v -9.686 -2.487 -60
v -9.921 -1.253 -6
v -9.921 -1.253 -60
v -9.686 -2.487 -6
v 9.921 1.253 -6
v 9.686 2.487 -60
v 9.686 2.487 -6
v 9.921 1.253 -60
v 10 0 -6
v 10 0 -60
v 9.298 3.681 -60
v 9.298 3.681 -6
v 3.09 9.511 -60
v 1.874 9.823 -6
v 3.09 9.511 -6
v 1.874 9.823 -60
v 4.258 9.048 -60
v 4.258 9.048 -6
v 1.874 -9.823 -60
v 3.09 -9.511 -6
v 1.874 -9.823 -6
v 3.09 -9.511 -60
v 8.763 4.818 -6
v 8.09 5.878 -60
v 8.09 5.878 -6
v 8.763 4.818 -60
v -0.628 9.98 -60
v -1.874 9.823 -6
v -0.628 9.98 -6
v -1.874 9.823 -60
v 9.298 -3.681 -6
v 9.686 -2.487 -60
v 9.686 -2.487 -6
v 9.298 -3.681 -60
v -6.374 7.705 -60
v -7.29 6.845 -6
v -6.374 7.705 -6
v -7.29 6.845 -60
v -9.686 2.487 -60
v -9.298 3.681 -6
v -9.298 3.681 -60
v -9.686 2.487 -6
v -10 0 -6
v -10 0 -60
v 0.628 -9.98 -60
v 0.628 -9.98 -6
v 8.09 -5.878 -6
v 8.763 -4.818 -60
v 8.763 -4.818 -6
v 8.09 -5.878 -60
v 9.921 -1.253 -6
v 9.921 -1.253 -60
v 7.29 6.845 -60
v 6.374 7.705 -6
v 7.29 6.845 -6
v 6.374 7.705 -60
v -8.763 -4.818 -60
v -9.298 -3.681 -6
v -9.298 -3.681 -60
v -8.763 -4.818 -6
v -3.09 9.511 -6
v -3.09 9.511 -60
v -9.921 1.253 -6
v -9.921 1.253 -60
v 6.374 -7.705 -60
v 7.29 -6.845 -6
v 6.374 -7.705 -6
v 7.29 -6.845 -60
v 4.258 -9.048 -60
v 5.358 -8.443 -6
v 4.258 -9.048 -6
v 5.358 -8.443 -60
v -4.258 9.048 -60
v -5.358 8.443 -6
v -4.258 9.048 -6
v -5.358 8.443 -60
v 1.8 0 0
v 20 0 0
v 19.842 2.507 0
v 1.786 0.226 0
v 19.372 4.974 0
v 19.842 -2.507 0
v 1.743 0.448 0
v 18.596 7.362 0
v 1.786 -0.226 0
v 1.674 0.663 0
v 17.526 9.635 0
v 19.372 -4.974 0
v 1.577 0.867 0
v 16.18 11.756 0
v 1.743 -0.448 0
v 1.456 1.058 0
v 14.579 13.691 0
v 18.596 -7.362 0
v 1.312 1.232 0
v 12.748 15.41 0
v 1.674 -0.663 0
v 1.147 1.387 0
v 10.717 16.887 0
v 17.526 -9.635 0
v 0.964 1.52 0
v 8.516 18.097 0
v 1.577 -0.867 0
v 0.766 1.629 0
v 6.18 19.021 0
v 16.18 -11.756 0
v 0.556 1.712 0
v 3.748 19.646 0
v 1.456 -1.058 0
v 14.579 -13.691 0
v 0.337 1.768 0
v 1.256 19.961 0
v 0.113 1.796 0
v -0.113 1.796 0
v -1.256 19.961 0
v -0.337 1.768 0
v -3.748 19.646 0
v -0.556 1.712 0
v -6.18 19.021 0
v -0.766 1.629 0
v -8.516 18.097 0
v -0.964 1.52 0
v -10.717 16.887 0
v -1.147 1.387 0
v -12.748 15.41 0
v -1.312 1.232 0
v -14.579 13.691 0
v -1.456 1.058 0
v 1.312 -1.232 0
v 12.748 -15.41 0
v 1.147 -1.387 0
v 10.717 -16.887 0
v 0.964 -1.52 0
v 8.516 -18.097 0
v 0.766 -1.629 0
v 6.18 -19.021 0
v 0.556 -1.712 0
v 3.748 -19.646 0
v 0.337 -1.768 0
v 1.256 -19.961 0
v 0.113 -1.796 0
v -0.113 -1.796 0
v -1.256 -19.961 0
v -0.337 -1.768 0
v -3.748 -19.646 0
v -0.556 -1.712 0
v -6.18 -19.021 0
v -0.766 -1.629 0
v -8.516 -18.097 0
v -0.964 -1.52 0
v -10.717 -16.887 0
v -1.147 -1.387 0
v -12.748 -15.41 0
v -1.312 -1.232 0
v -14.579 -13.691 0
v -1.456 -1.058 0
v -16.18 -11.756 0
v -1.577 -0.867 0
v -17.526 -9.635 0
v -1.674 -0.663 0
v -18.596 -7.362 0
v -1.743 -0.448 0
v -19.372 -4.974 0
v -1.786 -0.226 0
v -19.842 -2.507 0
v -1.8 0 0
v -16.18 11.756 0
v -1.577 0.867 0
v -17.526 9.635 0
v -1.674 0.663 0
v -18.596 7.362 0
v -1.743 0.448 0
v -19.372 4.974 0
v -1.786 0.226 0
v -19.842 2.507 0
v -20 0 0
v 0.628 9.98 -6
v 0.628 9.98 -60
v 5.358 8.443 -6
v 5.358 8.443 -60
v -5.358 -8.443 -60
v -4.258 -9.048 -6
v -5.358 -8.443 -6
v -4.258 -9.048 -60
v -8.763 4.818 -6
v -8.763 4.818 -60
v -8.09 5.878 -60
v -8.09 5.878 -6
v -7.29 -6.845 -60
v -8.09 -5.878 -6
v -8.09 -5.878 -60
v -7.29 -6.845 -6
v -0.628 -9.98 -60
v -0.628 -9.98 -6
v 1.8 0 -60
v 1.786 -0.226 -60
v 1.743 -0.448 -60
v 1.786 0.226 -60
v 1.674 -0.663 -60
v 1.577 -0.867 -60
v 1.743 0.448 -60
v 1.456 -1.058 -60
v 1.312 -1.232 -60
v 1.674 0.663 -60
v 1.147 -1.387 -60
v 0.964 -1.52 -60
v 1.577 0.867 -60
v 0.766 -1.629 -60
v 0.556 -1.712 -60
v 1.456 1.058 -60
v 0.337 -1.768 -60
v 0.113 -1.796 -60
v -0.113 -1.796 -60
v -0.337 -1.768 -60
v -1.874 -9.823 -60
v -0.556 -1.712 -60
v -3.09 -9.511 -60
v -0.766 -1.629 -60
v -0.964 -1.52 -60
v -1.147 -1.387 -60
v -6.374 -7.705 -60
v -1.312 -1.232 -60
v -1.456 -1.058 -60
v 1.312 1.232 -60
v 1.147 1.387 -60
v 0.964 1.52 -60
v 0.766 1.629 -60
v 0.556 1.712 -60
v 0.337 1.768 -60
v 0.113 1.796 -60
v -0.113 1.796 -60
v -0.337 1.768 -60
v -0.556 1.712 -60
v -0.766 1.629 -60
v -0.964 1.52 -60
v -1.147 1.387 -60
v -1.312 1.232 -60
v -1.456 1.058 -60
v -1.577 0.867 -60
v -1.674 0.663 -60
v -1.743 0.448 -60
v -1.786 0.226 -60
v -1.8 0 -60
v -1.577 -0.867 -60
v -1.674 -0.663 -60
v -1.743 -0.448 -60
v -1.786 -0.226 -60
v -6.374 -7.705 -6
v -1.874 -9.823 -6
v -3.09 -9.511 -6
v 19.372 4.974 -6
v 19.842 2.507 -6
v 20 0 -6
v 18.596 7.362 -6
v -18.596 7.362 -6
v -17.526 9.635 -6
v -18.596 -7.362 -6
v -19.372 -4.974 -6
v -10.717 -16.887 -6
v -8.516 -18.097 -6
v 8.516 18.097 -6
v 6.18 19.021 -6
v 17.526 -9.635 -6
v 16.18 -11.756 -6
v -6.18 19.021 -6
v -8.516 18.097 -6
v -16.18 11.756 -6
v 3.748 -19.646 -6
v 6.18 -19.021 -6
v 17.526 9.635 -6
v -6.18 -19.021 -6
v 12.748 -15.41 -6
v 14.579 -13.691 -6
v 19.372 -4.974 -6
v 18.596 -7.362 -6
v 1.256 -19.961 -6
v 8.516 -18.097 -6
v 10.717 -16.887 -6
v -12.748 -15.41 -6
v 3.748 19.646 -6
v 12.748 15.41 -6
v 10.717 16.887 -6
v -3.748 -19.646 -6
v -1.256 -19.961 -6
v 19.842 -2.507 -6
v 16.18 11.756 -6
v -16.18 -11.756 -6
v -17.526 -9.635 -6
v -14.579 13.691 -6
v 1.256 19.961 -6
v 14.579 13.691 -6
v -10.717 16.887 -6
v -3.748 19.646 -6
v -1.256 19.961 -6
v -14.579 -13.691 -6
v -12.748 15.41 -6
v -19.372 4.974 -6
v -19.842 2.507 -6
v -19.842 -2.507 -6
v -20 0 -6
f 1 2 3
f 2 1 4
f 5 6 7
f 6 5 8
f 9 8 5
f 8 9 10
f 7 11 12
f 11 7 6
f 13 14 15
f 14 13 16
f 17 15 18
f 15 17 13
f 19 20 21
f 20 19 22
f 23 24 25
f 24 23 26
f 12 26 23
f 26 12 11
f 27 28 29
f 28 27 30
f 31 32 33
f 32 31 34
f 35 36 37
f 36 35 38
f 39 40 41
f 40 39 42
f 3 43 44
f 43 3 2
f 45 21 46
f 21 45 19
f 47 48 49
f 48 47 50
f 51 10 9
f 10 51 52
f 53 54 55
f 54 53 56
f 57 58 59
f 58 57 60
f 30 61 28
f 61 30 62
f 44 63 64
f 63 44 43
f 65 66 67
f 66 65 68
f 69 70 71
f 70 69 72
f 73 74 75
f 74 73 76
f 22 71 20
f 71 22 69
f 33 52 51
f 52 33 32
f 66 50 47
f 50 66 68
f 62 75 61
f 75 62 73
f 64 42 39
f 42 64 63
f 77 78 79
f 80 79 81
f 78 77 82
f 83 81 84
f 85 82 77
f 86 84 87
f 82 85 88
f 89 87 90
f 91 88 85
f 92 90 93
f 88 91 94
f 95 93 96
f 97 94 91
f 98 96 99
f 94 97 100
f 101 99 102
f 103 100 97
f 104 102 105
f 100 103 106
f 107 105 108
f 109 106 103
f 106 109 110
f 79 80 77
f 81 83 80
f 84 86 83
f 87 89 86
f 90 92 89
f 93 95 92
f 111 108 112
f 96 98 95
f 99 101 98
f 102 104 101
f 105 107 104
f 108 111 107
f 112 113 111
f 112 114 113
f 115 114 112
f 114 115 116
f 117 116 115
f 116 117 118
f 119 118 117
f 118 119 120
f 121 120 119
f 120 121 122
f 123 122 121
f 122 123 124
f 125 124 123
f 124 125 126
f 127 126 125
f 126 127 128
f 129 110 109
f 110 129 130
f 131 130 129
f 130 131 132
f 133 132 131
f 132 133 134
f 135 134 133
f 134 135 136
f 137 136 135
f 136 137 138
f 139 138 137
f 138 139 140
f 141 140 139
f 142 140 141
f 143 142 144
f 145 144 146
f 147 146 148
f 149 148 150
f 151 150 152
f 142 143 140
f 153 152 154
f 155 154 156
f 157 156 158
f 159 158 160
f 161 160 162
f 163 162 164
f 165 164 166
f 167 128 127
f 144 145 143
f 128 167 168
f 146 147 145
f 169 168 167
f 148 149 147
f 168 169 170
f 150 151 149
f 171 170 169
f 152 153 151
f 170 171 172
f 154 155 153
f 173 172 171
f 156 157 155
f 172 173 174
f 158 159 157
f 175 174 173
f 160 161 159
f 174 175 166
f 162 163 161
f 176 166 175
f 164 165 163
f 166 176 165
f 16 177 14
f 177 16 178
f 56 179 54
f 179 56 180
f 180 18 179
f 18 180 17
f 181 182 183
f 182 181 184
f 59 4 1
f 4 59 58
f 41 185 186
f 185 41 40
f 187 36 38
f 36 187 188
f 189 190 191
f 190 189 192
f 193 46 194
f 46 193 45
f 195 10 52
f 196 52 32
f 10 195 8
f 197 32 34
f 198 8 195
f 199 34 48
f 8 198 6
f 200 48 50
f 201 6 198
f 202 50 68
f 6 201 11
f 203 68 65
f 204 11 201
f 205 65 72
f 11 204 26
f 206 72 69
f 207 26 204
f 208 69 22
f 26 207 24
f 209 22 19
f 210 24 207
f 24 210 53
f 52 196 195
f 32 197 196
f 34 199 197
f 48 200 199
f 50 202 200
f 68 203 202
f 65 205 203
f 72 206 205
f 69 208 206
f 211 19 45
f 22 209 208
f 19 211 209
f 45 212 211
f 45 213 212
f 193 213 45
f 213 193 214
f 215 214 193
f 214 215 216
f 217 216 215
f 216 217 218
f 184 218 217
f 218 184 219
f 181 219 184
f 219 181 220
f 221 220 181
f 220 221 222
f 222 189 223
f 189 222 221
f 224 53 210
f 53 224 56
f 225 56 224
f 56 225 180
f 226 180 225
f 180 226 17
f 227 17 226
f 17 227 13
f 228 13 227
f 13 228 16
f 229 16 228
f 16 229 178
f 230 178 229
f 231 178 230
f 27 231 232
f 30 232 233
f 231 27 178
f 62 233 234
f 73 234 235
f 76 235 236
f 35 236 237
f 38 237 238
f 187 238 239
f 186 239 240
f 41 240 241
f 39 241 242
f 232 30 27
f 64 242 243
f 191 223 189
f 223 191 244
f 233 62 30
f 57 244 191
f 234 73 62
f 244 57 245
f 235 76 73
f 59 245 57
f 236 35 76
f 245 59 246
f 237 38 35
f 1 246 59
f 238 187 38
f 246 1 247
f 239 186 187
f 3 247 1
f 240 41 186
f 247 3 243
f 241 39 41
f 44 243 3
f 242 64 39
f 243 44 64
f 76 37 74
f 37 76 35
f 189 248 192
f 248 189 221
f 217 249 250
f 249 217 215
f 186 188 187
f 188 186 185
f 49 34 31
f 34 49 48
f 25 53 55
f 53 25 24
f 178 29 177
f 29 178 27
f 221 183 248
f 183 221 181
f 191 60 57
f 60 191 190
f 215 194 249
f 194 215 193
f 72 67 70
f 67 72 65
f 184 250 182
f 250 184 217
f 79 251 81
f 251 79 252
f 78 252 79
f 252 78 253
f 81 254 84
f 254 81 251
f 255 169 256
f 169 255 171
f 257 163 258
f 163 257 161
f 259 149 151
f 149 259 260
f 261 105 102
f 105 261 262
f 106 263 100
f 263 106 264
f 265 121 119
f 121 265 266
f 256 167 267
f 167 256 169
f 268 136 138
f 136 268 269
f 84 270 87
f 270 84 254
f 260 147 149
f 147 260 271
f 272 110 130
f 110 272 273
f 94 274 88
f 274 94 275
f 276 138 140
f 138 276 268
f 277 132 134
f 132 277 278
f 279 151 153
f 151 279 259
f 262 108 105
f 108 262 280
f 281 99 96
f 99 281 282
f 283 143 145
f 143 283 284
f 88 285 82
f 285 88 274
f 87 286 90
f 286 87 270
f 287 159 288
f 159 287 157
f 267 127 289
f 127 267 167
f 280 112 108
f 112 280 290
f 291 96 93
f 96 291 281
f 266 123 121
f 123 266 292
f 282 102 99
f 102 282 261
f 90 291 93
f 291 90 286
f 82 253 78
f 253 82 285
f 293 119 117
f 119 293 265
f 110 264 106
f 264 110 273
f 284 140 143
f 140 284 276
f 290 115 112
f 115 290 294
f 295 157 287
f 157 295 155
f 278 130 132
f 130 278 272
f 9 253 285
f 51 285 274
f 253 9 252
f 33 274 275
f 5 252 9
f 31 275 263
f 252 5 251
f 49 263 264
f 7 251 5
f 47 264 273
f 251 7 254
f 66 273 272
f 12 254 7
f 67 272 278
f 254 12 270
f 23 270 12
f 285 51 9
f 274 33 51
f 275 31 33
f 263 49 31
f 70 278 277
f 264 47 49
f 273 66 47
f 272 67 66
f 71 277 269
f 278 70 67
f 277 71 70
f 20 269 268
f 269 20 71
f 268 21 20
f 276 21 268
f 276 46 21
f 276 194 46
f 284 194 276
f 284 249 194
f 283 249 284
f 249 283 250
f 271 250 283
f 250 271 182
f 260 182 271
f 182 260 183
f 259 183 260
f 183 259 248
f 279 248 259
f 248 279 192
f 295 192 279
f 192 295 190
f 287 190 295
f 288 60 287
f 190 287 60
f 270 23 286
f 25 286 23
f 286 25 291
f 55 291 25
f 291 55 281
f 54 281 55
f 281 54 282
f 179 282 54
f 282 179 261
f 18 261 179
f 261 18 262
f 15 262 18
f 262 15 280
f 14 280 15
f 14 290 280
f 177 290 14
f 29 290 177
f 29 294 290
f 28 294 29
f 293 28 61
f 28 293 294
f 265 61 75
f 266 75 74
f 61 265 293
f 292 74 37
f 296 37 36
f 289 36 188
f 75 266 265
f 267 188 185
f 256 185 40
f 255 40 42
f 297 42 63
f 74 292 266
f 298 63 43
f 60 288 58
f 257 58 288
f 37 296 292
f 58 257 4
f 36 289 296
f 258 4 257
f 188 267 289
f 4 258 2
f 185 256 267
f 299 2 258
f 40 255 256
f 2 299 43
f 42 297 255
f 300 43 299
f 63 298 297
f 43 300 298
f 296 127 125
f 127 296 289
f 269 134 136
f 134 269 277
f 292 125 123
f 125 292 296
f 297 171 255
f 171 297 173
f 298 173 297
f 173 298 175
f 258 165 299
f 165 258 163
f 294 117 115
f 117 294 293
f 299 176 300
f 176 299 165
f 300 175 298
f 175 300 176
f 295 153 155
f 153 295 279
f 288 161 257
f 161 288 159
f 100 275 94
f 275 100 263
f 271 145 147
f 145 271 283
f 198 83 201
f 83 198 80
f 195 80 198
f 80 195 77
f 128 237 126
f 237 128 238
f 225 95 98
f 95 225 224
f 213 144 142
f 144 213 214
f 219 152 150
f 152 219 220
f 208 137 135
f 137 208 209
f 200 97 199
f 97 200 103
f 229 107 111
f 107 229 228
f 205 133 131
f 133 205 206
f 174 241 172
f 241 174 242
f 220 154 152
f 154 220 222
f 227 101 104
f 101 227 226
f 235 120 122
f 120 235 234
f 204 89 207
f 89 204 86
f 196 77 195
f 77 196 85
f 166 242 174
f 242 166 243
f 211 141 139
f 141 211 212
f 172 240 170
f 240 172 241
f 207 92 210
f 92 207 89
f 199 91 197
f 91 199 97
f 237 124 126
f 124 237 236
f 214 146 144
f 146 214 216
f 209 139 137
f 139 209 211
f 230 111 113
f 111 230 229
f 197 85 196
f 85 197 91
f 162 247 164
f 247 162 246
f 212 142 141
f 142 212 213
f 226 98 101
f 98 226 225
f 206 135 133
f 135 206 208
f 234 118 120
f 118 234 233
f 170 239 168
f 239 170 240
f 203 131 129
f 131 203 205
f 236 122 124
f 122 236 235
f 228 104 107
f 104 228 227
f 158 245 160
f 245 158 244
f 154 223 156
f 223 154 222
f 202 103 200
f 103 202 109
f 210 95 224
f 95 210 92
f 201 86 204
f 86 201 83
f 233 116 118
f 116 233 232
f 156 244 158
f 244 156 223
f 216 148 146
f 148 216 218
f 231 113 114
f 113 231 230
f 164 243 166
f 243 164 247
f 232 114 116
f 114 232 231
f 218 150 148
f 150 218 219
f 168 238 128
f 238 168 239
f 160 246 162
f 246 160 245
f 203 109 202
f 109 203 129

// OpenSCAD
$fn = 50;


difference() {
	union() {
		translate(v = [0, 0, -60.0000000000]) {
			cylinder(h = 60, r = 10.0000000000);
		}
		translate(v = [0, 0, -6.0000000000]) {
			cylinder(h = 6, r = 20.0000000000);
		}
	}
	union() {
		#translate(v = [0, 0, -60]) {
			cylinder(h = 60, r = 1.8000000000);
		}
	}
}
